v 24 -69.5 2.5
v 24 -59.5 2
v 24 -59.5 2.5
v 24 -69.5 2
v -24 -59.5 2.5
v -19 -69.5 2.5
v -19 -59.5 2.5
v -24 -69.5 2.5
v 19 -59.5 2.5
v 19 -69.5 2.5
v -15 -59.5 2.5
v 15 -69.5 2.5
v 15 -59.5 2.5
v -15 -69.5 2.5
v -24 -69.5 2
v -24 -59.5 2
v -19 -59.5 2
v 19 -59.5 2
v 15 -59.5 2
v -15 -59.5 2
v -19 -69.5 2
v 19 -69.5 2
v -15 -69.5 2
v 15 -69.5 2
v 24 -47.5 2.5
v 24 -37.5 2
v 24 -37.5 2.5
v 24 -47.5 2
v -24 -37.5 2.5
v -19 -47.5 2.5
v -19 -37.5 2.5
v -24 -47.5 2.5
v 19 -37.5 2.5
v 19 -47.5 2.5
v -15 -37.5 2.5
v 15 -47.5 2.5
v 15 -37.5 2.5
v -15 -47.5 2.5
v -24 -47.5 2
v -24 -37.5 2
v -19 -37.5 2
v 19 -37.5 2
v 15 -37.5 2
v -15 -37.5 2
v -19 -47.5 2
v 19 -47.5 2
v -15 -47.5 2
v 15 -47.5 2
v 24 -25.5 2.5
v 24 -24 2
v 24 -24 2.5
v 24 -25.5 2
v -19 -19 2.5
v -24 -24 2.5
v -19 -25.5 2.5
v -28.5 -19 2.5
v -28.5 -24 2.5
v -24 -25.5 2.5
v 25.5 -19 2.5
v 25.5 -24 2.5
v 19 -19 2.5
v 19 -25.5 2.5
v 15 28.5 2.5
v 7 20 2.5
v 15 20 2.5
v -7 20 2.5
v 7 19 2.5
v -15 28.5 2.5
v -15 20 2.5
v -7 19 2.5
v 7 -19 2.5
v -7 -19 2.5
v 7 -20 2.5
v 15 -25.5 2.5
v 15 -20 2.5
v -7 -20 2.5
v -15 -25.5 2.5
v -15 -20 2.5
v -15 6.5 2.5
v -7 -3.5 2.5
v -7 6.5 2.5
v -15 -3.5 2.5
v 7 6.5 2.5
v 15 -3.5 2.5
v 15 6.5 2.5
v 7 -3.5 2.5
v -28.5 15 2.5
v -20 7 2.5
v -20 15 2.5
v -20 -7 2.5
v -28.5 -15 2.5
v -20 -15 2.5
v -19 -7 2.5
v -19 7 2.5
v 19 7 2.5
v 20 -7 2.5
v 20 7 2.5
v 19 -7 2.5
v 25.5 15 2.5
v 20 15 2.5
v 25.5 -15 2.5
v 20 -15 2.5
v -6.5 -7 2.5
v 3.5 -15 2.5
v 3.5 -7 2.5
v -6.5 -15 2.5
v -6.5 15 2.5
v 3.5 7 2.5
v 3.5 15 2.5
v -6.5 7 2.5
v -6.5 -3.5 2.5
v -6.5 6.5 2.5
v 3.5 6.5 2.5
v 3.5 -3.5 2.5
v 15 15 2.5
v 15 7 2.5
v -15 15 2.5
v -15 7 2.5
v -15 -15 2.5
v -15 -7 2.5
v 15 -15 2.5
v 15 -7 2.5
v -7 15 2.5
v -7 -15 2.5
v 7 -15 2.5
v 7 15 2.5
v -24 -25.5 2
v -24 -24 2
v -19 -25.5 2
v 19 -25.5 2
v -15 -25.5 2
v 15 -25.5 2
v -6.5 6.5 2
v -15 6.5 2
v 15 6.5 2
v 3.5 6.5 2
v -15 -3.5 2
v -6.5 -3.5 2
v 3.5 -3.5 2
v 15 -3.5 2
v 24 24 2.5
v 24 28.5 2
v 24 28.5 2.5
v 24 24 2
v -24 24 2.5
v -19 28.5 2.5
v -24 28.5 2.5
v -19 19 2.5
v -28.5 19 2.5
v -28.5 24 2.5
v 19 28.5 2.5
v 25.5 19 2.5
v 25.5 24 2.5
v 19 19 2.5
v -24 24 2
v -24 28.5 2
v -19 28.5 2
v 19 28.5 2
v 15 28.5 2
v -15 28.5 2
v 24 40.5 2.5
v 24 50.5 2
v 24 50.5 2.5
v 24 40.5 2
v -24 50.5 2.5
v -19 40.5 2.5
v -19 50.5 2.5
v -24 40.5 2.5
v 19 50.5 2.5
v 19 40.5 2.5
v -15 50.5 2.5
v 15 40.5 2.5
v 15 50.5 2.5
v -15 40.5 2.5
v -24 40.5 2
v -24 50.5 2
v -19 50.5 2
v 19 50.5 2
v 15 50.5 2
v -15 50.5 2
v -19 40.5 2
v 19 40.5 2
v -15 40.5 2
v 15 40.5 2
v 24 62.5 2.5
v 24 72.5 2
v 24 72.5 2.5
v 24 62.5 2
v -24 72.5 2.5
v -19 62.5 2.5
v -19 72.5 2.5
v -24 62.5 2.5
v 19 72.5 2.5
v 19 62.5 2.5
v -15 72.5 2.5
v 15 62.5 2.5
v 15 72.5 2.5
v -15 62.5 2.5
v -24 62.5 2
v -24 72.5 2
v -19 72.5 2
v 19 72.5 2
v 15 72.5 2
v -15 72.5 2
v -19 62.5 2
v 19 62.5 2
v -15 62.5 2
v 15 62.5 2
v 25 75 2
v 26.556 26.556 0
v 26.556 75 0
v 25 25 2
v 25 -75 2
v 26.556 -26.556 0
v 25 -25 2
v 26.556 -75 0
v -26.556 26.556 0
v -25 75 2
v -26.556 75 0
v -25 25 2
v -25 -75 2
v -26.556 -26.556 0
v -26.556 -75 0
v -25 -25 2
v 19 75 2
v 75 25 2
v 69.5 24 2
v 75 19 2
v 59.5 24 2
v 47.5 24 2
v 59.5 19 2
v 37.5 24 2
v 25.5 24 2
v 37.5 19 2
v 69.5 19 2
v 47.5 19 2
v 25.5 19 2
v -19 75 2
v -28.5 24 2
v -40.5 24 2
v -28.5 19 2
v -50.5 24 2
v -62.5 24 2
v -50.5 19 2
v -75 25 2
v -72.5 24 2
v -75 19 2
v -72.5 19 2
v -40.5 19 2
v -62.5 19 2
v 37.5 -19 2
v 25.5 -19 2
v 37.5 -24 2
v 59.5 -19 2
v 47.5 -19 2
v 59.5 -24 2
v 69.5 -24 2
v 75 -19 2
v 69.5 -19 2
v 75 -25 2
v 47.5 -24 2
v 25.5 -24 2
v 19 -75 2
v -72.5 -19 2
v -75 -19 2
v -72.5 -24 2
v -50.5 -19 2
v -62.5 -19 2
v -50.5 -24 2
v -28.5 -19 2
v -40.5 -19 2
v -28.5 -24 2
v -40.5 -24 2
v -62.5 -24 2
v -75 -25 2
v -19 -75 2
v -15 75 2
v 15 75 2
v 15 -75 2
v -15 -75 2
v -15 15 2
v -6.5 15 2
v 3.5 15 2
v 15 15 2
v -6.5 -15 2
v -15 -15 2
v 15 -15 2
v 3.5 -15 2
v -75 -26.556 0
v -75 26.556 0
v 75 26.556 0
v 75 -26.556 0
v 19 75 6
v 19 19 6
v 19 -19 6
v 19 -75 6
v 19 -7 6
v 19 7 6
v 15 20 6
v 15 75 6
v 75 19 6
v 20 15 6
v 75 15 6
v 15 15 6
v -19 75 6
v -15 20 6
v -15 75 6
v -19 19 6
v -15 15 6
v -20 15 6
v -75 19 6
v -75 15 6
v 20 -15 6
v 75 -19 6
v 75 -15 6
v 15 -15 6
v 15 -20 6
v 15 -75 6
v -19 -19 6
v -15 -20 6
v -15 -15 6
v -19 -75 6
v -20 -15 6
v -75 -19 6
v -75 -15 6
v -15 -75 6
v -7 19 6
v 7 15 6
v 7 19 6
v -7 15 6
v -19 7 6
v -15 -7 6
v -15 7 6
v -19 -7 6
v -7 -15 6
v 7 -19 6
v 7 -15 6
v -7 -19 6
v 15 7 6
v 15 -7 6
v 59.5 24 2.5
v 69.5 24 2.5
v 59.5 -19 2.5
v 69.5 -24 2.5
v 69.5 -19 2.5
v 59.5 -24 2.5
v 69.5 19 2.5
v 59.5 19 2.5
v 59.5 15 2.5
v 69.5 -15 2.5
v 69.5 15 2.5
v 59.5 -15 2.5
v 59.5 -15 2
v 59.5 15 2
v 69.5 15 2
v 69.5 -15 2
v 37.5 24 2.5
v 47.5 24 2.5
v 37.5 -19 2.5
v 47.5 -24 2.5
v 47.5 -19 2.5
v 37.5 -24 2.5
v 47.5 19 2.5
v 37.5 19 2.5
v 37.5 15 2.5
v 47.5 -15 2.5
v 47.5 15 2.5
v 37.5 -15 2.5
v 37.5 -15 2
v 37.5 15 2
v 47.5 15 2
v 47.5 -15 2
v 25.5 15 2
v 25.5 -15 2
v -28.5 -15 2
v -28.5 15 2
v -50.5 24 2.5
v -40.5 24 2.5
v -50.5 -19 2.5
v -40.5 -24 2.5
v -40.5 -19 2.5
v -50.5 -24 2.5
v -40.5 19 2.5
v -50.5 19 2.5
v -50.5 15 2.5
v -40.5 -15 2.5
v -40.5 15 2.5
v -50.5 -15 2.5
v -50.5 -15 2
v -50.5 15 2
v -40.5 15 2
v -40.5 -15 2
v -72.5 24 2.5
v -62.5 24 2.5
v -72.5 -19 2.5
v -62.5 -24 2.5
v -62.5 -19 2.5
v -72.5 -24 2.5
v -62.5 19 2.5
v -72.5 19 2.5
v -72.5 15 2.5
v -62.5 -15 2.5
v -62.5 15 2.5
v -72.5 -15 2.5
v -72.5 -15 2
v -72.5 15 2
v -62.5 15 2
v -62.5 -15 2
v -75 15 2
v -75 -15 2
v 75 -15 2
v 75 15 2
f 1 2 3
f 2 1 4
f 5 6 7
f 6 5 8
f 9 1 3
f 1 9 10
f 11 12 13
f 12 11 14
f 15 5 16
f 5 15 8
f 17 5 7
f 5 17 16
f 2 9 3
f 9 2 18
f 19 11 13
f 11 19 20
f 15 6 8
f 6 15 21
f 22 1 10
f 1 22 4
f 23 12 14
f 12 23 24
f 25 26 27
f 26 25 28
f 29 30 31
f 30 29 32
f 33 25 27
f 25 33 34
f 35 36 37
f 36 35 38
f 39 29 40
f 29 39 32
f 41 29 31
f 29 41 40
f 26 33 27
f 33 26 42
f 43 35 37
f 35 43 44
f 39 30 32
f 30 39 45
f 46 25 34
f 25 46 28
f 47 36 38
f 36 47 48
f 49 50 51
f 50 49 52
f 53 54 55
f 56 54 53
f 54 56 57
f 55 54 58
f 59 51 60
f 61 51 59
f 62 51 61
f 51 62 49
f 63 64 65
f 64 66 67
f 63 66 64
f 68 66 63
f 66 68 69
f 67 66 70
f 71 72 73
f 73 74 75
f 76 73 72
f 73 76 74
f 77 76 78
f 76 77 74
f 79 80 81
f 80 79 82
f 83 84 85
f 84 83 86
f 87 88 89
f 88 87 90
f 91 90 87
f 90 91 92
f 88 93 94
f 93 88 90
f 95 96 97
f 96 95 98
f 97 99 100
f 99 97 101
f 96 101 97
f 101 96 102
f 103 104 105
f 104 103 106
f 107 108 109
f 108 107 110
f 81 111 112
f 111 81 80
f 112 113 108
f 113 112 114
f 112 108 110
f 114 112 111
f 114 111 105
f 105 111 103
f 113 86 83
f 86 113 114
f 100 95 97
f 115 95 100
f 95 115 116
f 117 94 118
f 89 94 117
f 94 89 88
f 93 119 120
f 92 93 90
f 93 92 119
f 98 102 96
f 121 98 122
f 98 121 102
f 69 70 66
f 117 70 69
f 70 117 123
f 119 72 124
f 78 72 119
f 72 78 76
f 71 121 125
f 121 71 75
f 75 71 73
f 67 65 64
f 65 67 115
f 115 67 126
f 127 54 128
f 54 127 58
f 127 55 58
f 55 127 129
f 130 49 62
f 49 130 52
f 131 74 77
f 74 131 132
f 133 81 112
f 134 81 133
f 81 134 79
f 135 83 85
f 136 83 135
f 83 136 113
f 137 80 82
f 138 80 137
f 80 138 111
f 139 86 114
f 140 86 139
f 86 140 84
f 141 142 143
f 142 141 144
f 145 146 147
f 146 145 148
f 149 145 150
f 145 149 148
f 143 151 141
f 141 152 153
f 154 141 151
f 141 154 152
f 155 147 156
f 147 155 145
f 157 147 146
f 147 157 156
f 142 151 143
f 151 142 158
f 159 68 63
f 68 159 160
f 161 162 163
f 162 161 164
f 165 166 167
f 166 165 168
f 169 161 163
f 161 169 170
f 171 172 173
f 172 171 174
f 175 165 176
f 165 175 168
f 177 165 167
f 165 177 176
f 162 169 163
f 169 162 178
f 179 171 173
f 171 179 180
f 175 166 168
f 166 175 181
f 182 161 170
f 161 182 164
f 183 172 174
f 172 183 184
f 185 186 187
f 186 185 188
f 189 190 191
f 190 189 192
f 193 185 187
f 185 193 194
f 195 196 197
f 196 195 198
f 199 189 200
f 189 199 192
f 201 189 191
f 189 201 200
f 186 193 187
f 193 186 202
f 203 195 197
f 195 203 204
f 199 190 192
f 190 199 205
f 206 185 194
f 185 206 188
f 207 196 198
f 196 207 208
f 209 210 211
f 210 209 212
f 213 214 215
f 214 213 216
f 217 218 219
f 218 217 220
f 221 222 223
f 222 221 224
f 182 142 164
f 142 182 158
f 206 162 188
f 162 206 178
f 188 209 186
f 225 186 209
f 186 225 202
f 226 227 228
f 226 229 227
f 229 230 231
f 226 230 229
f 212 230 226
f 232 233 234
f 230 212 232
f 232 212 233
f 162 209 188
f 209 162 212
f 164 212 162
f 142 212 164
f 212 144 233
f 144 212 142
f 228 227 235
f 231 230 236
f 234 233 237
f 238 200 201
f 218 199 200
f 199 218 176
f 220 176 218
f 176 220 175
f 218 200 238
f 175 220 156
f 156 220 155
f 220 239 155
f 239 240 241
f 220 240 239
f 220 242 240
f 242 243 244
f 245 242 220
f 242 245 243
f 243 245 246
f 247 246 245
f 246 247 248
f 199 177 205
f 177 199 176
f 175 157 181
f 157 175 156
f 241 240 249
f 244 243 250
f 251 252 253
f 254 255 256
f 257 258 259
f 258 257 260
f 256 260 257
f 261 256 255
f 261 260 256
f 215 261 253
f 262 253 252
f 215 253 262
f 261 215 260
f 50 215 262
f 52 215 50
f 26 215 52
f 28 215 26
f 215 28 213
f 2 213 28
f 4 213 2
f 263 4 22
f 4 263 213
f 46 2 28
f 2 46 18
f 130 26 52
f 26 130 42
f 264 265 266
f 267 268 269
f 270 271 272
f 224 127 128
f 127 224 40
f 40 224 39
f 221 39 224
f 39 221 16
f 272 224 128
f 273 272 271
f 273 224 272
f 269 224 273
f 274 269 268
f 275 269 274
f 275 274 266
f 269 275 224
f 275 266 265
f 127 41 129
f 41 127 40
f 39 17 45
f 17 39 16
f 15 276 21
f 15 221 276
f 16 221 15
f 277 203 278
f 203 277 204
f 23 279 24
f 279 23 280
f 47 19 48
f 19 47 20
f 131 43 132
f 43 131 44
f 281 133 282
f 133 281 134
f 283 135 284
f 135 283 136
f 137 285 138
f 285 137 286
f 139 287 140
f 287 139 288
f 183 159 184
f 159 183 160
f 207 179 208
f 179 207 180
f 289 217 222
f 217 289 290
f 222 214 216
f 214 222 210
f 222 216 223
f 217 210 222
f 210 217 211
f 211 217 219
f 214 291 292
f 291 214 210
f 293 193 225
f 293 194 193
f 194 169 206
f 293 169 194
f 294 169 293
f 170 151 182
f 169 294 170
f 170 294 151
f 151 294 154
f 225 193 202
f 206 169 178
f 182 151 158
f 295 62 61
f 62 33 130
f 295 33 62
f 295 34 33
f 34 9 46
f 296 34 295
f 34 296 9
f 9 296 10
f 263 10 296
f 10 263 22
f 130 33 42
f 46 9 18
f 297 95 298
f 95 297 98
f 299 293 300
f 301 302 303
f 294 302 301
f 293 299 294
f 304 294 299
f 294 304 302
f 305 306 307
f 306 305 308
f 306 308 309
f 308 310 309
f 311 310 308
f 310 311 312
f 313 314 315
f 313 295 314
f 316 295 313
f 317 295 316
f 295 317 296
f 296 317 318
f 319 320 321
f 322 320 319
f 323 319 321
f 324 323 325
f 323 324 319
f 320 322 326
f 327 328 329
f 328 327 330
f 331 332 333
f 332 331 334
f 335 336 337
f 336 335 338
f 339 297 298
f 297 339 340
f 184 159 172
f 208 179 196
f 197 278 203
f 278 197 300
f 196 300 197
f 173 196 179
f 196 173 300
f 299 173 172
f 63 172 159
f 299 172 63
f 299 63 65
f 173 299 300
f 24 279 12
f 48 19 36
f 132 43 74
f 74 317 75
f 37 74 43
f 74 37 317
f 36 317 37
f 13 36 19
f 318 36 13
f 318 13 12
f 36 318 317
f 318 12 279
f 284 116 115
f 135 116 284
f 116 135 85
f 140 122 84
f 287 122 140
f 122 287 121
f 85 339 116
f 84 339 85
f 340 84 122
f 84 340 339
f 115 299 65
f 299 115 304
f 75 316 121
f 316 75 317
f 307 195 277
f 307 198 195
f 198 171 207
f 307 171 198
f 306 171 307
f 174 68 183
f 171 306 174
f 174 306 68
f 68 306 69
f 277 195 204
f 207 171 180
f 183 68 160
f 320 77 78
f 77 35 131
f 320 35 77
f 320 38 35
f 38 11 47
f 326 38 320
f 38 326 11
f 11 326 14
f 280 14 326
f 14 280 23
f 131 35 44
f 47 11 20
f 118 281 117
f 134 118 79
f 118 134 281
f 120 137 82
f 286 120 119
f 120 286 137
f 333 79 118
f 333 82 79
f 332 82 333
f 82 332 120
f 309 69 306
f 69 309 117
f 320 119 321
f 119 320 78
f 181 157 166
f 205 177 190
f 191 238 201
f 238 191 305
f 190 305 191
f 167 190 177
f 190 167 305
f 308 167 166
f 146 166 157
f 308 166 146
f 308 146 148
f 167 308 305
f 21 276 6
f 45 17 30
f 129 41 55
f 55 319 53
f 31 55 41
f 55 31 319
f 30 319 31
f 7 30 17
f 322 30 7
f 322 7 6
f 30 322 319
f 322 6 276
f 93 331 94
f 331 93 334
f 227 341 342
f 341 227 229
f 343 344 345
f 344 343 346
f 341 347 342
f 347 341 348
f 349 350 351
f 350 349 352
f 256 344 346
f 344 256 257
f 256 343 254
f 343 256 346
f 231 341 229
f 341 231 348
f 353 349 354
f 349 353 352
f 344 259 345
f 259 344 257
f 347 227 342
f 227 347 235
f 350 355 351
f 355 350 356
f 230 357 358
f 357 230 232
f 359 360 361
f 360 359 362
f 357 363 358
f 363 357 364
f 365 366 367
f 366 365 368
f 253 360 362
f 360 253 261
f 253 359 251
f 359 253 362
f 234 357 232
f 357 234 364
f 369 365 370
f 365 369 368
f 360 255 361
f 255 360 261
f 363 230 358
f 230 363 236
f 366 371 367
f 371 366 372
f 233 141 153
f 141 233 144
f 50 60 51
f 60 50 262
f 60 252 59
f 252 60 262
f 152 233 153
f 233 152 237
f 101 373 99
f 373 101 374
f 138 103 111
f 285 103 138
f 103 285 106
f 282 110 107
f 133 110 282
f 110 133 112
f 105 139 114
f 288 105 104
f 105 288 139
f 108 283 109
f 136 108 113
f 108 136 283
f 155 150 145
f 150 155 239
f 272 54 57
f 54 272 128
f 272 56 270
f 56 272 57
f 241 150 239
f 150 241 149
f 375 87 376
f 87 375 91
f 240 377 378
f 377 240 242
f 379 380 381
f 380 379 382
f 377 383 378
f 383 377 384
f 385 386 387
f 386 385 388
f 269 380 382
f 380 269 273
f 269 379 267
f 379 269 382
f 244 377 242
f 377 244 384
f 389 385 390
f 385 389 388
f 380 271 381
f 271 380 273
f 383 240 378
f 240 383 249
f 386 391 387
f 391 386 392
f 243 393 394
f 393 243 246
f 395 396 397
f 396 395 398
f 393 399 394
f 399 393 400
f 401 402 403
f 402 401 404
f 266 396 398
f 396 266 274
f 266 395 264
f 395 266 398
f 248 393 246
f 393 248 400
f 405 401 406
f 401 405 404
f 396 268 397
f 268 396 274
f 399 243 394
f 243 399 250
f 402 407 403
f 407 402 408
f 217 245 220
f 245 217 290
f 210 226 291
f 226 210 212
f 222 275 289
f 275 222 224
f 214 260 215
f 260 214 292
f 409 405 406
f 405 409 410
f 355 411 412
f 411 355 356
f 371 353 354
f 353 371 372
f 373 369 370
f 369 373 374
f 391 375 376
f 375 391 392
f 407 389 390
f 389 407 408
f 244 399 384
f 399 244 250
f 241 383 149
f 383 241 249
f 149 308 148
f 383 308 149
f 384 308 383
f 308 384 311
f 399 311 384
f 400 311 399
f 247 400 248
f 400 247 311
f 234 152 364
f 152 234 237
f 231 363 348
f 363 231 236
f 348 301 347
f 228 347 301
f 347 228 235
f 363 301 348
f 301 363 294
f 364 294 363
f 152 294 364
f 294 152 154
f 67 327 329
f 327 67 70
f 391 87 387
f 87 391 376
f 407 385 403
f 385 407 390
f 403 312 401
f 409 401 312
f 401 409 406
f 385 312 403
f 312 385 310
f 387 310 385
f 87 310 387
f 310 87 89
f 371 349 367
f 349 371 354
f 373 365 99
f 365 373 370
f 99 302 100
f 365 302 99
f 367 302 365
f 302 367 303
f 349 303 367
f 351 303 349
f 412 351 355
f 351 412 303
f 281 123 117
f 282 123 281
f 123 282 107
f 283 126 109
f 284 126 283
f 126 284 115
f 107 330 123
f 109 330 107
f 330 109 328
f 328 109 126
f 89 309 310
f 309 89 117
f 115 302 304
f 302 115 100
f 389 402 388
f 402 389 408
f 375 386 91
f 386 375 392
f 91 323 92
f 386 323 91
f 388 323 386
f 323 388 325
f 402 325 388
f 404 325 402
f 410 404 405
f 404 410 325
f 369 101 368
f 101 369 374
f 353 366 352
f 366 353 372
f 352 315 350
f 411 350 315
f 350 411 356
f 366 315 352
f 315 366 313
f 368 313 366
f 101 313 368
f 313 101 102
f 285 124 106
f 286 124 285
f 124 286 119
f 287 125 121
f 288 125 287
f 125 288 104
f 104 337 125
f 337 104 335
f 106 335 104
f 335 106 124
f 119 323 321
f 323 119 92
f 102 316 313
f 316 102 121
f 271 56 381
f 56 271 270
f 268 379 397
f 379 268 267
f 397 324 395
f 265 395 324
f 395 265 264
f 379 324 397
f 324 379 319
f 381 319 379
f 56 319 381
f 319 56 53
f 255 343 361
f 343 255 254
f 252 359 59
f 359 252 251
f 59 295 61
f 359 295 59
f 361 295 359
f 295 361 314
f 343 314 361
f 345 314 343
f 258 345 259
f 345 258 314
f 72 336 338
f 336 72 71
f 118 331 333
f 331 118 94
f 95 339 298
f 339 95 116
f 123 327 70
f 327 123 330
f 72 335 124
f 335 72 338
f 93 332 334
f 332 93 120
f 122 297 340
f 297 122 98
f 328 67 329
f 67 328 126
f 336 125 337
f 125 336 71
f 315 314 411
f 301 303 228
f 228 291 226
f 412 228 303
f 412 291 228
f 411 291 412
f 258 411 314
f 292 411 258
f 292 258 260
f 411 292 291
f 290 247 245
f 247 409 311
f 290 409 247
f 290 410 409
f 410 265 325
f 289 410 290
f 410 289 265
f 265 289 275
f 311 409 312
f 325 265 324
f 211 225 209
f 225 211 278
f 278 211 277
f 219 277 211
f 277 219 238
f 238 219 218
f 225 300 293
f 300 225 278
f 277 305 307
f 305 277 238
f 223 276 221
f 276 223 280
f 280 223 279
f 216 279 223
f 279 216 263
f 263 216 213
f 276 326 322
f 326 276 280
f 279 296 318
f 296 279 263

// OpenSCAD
//
// Crossing track, made to be compatible with Geotrax®
// (Work in progress : no join system between tracks)
// Author: Francois Crevola (francois@crevola.org)
//

// Try d = 0 for a more "geotraxed" version
// Try d = -7 for a simplified, more 3D printer frendly version

d = -7;

intersection() {
  translate([0,0,10]) cube(size=[150,150,20],center=true);
  translate([0,0,d]) crossingTrack();
}

module crossingTrack() {
  difference() {
    union() {
      rotate([0,0,0])	  longTrack();
      rotate([0,0,90]) longTrack();
    }

    for (i = [0,90,180,270]) {
	  rotate([0,0,i]) translate([0, 11, 11.5]) cube(size = [40,8,4], center = true);
    }
  }
}

module longTrack() {

long = 153;

// main piece
	rotate([90,0,0])
	translate([0, 0, -long/2]) // center
	linear_extrude(height=long)
		polygon(points=[[0,7],[-25,7],[-30,0],[-32,0],[-25,9],[-19,9],[-19,13],[-15,13],[-15,9],[15,9],[15,13],[19,13],[19,9],[25,9],[32,0],[30,0],[25,7]], paths=[[0,1,2,3,4,5,6,7,8,9,10,11,12,13,14,15,16,17,18,19,20]]);


// + traverses
spacing = 22;
max = 7;
delta = 10;
for (i = [1:max]) // n iterations
{
	translate([0,-long/2+(i*spacing)-delta,9])
	cube(size = [48, 10, 1], center = true);
}

// + supports
for (i = [-1, 0, 1]) {
	translate([0,i*(long/3),0])
	rotate([90,0,0])
	linear_extrude(height=2.5)
		polygon(points=[[-32,0],[-25,9],[25,9],[32,0]], paths=[[0,1,2,3,4,5,6,7,8,9,10,11,12,13,14,15,16,17,18,19,20]]);
}

}
